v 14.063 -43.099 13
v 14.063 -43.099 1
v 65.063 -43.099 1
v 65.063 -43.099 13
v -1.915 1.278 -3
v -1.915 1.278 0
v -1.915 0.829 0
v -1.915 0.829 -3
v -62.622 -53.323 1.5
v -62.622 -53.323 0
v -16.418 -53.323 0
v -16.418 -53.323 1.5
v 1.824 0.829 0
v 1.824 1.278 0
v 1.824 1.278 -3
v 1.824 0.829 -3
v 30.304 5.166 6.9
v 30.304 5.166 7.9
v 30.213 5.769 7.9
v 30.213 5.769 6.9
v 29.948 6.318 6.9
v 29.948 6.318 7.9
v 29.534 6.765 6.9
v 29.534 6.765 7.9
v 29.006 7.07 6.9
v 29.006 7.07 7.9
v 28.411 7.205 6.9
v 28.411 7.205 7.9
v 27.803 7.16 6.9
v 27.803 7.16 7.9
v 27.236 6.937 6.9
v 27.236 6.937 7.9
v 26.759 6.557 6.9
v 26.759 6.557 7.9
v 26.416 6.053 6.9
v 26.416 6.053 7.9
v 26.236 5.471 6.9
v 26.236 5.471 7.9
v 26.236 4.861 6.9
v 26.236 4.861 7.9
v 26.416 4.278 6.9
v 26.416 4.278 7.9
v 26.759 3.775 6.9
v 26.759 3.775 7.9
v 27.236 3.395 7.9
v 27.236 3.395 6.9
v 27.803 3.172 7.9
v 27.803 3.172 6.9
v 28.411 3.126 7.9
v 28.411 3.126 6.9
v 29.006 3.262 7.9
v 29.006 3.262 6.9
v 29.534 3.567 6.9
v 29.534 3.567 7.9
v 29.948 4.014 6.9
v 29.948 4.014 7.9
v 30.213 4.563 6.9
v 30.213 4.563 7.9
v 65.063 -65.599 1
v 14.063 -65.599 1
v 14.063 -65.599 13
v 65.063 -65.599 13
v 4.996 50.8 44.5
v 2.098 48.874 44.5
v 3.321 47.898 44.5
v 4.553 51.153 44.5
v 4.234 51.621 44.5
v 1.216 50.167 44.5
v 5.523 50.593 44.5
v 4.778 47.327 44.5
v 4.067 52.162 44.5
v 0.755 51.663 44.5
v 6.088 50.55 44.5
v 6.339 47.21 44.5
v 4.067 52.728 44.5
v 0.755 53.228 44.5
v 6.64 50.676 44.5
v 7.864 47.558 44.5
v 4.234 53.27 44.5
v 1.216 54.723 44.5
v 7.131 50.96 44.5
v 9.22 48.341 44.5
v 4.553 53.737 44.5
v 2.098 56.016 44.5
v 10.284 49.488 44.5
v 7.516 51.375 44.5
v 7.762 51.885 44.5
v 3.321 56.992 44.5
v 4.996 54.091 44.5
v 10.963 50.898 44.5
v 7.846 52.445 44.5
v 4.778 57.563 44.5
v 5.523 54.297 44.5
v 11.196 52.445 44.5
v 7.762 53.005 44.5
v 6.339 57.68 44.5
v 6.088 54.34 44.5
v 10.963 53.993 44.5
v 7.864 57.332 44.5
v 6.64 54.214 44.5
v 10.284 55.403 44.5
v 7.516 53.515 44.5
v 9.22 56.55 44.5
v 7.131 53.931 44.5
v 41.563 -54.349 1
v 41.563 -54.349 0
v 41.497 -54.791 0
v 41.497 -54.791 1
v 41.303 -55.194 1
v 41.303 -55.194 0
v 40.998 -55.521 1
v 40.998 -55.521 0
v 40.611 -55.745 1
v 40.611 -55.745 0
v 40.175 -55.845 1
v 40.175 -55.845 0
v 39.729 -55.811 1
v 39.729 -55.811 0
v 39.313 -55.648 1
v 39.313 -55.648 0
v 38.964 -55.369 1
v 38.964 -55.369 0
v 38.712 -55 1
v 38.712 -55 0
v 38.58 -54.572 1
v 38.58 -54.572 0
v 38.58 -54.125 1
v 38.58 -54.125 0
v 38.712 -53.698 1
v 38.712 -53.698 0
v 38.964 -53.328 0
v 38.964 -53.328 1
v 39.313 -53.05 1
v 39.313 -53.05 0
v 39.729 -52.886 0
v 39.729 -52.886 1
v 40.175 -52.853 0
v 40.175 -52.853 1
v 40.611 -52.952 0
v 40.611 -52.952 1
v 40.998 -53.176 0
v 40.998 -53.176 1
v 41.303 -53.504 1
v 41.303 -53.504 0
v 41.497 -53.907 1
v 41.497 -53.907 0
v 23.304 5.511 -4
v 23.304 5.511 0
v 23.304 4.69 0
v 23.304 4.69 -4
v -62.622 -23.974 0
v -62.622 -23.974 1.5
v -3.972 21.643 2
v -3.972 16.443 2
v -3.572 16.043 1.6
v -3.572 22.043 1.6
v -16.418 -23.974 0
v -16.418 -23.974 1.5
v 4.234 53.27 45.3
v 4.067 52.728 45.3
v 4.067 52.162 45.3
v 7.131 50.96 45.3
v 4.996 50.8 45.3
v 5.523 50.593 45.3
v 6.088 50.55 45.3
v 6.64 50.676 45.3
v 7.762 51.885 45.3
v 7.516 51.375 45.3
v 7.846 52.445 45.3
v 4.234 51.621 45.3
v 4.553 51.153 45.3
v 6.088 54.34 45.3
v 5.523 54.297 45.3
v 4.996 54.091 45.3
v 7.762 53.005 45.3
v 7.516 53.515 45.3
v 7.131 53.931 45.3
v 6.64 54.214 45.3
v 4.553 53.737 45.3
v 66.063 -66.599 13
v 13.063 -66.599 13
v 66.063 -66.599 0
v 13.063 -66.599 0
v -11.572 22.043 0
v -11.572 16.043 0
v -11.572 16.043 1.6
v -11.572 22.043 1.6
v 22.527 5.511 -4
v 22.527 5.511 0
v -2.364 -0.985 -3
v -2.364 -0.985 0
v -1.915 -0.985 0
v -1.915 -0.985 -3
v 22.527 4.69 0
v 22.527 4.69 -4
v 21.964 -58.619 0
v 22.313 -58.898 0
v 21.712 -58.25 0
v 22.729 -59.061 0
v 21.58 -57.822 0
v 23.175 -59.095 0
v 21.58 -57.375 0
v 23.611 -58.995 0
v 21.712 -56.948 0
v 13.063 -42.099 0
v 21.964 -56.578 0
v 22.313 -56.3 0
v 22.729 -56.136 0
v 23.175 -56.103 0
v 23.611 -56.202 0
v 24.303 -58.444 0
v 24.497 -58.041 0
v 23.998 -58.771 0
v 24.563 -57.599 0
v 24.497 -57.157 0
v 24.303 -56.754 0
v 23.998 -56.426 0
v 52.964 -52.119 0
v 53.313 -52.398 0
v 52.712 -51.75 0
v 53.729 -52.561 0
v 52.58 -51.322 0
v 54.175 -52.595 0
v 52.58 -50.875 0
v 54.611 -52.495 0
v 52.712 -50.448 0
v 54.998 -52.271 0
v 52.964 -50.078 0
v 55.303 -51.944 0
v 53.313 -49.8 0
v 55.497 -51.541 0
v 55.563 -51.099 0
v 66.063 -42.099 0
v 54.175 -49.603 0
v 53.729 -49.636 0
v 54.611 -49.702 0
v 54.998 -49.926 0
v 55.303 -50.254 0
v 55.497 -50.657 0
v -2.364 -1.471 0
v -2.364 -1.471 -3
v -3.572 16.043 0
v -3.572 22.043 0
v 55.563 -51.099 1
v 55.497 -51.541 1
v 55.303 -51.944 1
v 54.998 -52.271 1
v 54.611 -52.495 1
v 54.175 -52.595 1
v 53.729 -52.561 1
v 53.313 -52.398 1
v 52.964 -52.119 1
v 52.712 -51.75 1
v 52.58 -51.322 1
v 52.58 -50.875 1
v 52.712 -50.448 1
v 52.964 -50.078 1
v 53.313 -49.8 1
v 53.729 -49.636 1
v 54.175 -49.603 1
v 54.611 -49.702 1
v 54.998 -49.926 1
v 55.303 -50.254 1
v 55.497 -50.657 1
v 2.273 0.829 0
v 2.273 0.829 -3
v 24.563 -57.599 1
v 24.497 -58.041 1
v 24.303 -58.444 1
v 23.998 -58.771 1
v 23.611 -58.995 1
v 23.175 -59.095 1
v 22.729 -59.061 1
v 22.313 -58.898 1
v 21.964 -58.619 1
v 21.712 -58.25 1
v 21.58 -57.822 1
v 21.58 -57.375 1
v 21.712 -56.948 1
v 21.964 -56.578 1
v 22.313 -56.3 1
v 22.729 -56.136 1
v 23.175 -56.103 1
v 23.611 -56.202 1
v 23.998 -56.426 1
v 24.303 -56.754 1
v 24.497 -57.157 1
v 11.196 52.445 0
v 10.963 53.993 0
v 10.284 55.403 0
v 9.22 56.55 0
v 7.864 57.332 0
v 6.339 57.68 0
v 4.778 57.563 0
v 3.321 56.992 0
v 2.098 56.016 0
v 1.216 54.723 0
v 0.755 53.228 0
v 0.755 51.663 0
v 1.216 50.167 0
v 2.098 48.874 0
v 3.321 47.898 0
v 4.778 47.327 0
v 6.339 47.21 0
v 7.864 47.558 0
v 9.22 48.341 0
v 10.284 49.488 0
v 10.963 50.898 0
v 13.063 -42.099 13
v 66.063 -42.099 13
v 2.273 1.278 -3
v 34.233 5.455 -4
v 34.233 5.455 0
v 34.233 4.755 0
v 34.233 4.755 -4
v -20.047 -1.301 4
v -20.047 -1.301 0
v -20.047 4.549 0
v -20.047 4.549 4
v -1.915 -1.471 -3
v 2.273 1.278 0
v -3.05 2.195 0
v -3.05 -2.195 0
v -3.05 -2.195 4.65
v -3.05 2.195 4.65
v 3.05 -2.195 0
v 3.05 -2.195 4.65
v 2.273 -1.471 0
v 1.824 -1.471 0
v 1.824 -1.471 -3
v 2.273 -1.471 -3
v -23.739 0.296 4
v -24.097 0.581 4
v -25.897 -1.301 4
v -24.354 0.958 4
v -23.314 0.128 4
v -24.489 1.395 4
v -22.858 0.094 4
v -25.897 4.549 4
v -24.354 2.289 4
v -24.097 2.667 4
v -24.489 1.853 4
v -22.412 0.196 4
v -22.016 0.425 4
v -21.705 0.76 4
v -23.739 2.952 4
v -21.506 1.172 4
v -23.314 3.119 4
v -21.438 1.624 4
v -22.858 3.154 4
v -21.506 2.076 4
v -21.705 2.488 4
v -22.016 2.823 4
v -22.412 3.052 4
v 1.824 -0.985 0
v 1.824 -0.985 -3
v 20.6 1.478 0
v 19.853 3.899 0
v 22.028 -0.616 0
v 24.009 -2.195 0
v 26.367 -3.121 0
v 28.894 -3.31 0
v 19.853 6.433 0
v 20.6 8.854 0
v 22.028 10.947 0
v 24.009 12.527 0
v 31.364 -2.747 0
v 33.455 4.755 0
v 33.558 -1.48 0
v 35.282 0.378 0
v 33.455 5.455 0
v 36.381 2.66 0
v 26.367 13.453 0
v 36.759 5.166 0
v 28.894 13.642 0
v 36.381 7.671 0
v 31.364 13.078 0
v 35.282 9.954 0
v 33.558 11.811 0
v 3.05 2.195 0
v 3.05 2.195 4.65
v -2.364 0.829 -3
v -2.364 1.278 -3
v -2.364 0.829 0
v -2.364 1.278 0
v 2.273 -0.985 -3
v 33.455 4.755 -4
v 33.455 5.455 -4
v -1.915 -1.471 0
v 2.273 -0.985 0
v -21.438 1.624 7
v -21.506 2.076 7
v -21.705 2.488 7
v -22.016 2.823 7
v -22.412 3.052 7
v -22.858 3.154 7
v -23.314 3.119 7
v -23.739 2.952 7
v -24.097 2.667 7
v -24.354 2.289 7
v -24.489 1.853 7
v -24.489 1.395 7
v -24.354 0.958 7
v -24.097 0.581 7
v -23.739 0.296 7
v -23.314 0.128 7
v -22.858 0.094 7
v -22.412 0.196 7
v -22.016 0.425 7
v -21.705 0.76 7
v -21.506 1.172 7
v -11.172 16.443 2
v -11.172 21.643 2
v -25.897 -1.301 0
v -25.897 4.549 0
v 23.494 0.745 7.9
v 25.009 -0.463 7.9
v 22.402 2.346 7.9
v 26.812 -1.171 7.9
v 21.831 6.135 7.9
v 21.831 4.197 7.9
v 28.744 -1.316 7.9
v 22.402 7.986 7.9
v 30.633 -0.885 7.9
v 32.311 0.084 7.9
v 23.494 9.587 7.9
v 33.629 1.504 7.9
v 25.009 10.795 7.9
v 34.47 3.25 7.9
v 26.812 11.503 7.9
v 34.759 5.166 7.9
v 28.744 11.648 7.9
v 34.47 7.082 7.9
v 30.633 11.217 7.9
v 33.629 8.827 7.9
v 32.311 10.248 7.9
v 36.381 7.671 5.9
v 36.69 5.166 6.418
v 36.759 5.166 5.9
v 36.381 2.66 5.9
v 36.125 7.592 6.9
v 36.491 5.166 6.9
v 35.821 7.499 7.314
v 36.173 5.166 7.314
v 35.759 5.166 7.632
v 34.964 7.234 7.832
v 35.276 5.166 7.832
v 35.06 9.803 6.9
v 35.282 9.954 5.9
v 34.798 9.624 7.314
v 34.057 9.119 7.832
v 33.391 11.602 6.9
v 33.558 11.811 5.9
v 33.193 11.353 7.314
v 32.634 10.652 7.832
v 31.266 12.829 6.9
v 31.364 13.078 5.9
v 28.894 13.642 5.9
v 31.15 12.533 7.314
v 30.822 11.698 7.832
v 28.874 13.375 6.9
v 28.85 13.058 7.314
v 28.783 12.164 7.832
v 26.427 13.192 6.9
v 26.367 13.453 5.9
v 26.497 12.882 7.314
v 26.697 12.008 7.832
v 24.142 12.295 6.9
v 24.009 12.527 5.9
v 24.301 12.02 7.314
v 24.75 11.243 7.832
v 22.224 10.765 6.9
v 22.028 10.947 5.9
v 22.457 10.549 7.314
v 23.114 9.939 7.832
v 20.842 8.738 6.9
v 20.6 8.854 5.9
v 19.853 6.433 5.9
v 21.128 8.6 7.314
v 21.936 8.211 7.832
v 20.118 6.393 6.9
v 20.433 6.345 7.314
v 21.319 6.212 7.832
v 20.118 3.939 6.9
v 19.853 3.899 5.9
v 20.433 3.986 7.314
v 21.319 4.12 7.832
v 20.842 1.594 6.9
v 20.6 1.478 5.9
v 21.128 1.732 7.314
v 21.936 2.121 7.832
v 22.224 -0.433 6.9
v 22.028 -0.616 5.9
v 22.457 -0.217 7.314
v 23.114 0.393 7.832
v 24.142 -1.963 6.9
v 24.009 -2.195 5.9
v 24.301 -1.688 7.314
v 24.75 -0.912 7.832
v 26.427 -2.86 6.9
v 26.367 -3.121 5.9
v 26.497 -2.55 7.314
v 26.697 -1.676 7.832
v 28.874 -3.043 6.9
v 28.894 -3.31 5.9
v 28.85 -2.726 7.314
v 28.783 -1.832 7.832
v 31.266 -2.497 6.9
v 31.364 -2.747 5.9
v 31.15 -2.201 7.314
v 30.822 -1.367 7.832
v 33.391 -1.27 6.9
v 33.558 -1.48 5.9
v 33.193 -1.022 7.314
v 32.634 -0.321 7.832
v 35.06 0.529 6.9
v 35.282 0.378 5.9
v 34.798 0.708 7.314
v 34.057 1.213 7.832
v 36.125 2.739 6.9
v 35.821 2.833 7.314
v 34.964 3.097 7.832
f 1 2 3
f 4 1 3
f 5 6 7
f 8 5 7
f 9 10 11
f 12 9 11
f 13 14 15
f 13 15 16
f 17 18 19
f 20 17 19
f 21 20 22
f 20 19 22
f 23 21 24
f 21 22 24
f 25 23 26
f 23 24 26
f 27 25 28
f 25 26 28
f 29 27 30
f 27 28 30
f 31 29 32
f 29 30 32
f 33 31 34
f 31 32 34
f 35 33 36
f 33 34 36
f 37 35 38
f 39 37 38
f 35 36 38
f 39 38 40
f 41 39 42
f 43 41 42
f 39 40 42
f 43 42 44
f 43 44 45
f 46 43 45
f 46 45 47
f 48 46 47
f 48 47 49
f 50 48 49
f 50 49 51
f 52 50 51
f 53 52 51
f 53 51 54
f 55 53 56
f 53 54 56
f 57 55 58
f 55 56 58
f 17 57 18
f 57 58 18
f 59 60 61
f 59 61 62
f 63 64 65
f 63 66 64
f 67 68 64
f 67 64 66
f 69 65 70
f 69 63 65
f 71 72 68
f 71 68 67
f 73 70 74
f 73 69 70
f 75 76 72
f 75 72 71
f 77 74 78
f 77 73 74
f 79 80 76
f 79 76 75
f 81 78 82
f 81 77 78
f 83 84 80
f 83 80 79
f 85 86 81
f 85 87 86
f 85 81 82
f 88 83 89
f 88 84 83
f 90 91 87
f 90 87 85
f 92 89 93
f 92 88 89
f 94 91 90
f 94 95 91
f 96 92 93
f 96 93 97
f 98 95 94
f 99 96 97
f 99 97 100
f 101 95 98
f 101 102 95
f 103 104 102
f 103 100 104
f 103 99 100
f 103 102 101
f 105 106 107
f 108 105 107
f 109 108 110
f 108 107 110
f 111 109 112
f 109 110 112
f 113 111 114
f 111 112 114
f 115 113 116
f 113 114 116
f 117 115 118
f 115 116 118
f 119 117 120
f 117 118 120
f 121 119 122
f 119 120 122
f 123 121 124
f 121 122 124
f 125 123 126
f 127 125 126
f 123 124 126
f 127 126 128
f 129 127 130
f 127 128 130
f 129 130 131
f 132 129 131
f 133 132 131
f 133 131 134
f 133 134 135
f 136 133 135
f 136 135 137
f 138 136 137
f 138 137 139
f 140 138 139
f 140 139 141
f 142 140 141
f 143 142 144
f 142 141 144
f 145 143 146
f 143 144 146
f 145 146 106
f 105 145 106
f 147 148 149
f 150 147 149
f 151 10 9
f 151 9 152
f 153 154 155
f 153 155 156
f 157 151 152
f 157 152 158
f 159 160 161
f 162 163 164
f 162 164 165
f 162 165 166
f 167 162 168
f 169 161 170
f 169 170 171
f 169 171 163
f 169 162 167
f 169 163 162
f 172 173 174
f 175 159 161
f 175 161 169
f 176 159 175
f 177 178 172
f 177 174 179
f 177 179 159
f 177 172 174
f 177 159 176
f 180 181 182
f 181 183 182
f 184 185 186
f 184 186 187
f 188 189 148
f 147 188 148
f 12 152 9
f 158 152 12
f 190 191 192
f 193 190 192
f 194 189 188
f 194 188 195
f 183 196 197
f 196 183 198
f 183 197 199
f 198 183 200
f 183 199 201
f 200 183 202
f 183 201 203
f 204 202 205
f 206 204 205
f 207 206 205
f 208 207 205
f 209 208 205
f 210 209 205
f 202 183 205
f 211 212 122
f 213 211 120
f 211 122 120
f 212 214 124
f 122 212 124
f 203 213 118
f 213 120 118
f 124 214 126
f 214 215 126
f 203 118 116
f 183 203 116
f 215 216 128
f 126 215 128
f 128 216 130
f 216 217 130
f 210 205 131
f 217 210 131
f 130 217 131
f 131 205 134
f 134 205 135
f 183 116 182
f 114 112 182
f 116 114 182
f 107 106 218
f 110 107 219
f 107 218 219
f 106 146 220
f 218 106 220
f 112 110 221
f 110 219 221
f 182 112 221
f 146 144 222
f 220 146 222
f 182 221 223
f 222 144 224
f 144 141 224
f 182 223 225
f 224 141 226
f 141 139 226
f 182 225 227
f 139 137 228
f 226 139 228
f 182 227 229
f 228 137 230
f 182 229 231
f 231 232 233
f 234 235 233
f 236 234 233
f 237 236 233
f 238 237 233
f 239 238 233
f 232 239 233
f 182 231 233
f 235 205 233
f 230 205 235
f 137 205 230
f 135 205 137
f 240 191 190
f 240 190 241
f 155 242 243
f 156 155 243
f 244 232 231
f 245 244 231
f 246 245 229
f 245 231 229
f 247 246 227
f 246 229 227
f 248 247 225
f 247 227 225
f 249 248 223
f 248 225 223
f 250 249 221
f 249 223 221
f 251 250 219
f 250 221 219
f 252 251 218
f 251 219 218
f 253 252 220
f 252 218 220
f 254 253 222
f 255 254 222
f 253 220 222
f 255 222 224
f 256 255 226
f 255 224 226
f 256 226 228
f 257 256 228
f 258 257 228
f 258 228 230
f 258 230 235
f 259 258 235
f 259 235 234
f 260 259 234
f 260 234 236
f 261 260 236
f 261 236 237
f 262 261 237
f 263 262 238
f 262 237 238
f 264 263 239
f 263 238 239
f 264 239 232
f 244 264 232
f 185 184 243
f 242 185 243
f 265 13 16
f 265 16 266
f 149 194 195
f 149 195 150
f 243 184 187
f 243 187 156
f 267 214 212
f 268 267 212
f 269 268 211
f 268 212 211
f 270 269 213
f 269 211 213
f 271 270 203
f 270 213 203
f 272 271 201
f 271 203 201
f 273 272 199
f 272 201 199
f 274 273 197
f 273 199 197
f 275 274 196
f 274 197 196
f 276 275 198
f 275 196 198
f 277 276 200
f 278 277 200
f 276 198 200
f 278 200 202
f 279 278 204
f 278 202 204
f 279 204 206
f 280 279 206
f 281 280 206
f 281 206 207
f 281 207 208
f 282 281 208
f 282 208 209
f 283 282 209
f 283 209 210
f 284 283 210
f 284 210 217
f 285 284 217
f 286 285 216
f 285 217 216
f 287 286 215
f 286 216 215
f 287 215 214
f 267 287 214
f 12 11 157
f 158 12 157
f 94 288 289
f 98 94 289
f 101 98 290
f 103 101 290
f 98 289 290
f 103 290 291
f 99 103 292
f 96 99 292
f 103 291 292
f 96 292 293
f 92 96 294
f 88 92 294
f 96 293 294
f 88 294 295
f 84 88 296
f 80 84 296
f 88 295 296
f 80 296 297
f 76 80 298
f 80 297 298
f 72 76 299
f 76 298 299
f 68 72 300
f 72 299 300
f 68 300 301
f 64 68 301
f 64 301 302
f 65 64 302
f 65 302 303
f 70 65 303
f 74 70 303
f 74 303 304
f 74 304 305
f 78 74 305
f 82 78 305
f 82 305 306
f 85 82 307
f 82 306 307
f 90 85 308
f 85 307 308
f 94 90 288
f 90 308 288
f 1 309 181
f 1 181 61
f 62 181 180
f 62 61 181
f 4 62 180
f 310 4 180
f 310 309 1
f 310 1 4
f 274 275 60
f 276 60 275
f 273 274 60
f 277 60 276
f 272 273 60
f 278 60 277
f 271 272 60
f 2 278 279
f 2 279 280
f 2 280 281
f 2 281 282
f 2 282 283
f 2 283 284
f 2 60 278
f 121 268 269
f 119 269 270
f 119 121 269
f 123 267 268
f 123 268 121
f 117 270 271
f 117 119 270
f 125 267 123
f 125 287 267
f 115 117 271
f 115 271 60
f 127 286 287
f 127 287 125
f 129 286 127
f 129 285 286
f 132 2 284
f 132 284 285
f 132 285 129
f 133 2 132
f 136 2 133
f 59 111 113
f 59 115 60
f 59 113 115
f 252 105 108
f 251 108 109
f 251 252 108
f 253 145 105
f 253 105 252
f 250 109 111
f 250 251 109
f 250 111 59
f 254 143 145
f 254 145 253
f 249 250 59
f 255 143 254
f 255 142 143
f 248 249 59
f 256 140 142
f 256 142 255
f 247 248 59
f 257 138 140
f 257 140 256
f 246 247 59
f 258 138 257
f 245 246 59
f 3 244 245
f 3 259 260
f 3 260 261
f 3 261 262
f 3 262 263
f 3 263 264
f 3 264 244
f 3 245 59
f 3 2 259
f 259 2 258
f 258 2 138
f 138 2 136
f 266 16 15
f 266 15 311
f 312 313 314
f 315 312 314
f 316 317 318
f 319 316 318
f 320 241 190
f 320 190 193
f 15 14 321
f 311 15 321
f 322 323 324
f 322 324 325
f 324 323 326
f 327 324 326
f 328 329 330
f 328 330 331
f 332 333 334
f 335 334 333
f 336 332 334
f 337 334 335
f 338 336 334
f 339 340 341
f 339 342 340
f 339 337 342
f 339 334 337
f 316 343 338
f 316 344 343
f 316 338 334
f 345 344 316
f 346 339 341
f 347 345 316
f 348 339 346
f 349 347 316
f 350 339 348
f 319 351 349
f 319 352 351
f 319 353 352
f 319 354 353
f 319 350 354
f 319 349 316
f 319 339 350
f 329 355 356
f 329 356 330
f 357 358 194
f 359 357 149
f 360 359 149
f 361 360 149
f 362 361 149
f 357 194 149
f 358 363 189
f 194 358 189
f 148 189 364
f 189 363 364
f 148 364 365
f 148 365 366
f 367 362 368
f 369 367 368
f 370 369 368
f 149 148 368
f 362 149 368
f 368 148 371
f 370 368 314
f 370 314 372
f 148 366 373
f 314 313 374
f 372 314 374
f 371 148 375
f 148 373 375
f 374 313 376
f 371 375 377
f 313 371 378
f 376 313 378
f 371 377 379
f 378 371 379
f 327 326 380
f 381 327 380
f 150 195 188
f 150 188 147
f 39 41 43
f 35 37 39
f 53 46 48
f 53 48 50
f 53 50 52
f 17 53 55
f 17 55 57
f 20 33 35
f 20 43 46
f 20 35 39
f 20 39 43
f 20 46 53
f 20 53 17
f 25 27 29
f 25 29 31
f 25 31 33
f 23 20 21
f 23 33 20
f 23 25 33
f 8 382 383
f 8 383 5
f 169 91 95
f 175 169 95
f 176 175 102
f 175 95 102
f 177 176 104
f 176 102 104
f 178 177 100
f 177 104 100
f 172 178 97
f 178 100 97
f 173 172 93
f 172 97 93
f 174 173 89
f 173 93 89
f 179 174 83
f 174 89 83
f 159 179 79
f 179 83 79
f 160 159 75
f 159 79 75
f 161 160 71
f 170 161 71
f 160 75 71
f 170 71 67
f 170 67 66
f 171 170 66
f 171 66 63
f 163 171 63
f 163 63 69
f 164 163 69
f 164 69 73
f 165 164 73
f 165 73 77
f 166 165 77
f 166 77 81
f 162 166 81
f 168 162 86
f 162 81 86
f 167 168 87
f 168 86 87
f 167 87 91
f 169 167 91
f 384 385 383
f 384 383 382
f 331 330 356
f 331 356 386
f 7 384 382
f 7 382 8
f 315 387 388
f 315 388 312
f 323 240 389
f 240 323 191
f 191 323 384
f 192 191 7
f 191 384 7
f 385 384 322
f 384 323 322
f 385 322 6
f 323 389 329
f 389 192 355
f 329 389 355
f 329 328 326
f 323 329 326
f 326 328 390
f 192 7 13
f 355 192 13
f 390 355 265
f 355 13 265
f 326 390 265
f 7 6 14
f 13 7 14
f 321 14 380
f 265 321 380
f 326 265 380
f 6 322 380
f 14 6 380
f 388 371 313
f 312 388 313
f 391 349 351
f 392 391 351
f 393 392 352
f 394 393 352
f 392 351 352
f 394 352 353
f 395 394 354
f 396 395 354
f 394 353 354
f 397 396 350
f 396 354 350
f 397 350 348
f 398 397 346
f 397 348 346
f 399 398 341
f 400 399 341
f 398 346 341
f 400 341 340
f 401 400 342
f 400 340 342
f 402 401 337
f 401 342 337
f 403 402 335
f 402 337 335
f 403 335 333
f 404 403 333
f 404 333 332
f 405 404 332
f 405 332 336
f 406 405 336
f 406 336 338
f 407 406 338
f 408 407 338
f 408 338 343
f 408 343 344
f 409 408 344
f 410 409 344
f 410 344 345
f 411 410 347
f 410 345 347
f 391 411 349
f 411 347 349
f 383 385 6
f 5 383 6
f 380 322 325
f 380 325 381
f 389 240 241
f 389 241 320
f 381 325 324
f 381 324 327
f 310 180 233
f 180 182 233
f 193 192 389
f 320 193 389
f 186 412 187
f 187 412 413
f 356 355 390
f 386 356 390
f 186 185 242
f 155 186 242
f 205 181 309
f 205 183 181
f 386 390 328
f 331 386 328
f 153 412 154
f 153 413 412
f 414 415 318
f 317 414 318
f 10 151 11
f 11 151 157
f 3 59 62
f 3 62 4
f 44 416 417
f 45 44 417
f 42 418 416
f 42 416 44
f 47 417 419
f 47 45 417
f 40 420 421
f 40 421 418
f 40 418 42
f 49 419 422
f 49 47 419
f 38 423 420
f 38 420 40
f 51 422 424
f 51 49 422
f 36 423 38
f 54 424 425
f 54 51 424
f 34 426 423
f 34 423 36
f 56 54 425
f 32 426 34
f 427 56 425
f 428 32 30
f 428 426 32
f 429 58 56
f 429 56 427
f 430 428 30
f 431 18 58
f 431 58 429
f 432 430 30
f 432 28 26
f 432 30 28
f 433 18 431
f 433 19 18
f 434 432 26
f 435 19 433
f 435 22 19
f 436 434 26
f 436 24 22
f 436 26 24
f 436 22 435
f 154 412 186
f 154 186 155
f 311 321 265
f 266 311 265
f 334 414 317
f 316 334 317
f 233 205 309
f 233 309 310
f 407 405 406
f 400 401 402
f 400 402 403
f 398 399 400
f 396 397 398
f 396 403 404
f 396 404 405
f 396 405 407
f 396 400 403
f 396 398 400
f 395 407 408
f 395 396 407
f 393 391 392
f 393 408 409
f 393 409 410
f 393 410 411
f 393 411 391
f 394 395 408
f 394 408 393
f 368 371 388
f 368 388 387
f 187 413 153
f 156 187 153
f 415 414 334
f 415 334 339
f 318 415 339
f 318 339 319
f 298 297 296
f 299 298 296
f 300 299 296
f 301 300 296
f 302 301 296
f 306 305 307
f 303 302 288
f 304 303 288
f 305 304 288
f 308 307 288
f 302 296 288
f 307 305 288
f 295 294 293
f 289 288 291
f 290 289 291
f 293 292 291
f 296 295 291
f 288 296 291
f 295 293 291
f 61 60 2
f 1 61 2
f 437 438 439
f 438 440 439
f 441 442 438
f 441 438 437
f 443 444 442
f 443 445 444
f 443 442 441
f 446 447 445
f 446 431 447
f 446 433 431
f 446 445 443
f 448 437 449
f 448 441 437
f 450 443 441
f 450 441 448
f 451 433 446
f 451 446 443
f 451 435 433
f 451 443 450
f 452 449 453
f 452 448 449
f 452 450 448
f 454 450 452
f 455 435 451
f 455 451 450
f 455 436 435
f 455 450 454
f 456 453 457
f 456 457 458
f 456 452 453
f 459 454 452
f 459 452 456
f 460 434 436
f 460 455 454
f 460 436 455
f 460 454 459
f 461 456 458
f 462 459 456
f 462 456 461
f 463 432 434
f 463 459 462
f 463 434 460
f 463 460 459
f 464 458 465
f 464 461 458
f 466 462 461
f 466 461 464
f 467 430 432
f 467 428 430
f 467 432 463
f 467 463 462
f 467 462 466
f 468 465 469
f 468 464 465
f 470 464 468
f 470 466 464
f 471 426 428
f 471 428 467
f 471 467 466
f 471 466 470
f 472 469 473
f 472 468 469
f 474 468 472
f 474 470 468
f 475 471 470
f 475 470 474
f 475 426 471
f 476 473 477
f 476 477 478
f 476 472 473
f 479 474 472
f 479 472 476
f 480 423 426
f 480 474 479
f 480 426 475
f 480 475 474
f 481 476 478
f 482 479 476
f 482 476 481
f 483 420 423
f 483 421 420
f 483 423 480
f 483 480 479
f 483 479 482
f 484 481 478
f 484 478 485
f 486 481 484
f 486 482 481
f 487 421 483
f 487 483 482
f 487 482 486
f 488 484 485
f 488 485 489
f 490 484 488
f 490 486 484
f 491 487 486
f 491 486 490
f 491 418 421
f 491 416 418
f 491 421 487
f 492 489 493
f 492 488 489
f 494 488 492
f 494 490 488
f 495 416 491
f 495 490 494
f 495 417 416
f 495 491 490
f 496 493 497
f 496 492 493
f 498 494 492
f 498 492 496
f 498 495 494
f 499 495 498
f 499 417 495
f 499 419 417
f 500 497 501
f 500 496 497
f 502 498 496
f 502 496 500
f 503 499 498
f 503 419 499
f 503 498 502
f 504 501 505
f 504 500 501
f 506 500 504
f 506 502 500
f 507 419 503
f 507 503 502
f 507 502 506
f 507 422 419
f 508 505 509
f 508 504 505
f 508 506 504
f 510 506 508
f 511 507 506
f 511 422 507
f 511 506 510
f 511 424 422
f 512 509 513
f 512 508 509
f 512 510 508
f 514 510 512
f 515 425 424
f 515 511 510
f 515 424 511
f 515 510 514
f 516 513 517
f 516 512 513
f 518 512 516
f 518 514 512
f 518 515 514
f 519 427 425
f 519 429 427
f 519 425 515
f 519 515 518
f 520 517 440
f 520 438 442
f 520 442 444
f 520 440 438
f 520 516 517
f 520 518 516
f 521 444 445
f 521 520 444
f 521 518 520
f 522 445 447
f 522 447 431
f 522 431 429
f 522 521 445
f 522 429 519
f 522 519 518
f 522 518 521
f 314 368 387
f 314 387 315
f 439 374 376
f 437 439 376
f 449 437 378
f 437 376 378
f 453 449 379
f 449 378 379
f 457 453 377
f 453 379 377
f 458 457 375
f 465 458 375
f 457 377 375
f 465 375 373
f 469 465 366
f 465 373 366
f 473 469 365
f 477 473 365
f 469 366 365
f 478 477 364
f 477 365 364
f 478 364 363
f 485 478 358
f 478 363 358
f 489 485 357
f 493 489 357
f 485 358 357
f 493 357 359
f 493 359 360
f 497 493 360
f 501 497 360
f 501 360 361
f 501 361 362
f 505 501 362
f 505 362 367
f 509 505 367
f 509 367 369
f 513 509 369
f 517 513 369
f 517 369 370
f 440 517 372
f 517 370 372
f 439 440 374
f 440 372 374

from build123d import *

# Parameters (mm, degrees)
F0_W      = 6.1
F0_H      = 4.39
F1_DEPTH  = 4.65
F2_W      = 0.448795
F2_H      = 0.48622
F2_H_2    = 0.448818
F3_DEPTH  = 3
F4_W      = 5.85
F4_H      = 5.85
F5_DEPTH  = 4
F6_R      = 1.5339
F7_DEPTH  = 3
F8_R      = 8.5
F9_DEPTH  = 7.9
F10_R     = 2
F11_R     = 2.045194
F12_DEPTH = 1
F13_W     = 0.777537
F13_H     = 0.820734
F13_W_2   = 0.777539
F13_H_2   = 0.699977
F14_DEPTH = 4
F15_W     = 8
F15_H     = 6
F16_DEPTH = 2
F17_SIZE  = 0.4
F18_R     = 5.25
F19_DEPTH = 44.5
F20_R     = 1.9
F21_DEPTH = 0.8
F22_W     = 46.203874
F22_H     = 29.349632
F23_DEPTH = 1.5
F24_W     = 53
F24_H     = 24.5
F25_DEPTH = 1
F26_W     = 53
F26_H     = 24.5
F26_W_2   = 51
F26_H_2   = 22.5
F27_DEPTH = 12
F28_R     = 1.5
F29_DEPTH = 1


with BuildPart() as f1:
    # F0 (on Top) → F1 (new body)
    with BuildSketch(Plane.XY):
        Rectangle(F0_W, F0_H)
    extrude(amount=F1_DEPTH)

    # F2 (on face) → F3 (join)
    with BuildSketch(Plane(origin=(0, 0, 0), x_dir=(1, 0, 0), z_dir=(0, 0, -1))):
        with Locations((-2.139867, 1.227854)):
            Rectangle(F2_W, F2_H)
        with Locations((-2.139867, -1.053639)):
            Rectangle(F2_W, F2_H_2)
        with Locations((2.048888, 1.227854)):
            Rectangle(F2_W, F2_H)
        with Locations((2.048888, -1.053639)):
            Rectangle(F2_W, F2_H_2)
    extrude(amount=F3_DEPTH)


with BuildPart() as f5:
    # F4 (on Top) → F5 (new body)
    with BuildSketch(Plane.XY):
        with Locations((-22.972229, 1.6239)):
            Rectangle(F4_W, F4_H)
    extrude(amount=F5_DEPTH)

    # F6 (on face) → F7 (join)
    with BuildSketch(Plane.XY.offset(4)):
        with Locations((-22.972229, 1.6239)):
            Circle(F6_R)
    extrude(amount=F7_DEPTH)


with BuildPart() as f9:
    # F8 (on Top) → F9 (new body)
    with BuildSketch(Plane.XY):
        with Locations((28.258514, 5.165863)):
            Circle(F8_R)
    extrude(amount=F9_DEPTH)

    # F10
    f10_edges = [f9.edges().sort_by_distance(p)[0] for p in [
        (19.758514, 5.165863, 7.9),
    ]]
    fillet(f10_edges, radius=F10_R)

    # F11 (on face) → F12 (cut)
    with BuildSketch(Plane.XY.offset(7.9)):
        with Locations((28.258514, 5.165863)):
            Circle(F11_R)
    extrude(amount=-F12_DEPTH, mode=Mode.SUBTRACT)

    # F13 (on face) → F14 (join)
    with BuildSketch(Plane(origin=(0, 0, 0), x_dir=(1, 0, 0), z_dir=(0, 0, -1))):
        with Locations((22.915408, -5.100402)):
            Rectangle(F13_W, F13_H)
        with Locations((33.844127, -5.104819)):
            Rectangle(F13_W_2, F13_H_2)
    extrude(amount=F14_DEPTH)


with BuildPart() as f16:
    # F15 (on Top) → F16 (new body)
    with BuildSketch(Plane.XY):
        with Locations((-7.572418, 19.042922)):
            Rectangle(F15_W, F15_H)
    extrude(amount=F16_DEPTH)

    # F17
    f17_edges = [f16.edges().sort_by_distance(p)[0] for p in [
        (-7.572418, 16.042922, 2),
        (-7.572418, 22.042922, 2),
        (-3.572418, 19.042922, 2),
        (-11.572418, 19.042922, 2),
    ]]
    chamfer(f17_edges, length=F17_SIZE)


with BuildPart() as f19:
    # F18 (on Top) → F19 (new body)
    with BuildSketch(Plane.XY):
        with Locations((5.946203, 52.445121)):
            Circle(F18_R)
    extrude(amount=F19_DEPTH)

    # F20 (on face) → F21 (join)
    with BuildSketch(Plane.XY.offset(44.5)):
        with Locations((5.946203, 52.445121)):
            Circle(F20_R)
    extrude(amount=F21_DEPTH)


with BuildPart() as f23:
    # F22 (on Top) → F23 (new body)
    with BuildSketch(Plane.XY):
        with Locations((-39.520297, -38.648531)):
            Rectangle(F22_W, F22_H)
    extrude(amount=F23_DEPTH)


with BuildPart() as f25:
    # F24 (on Top) → F25 (new body)
    with BuildSketch(Plane.XY):
        with Locations((39.563232, -54.34875)):
            Rectangle(F24_W, F24_H)
    extrude(amount=F25_DEPTH)

    # F26 (on face) → F27 (join)
    with BuildSketch(Plane.XY.offset(1)):
        with Locations((39.563232, -54.34875)):
            Rectangle(F26_W, F26_H)
        with Locations((39.563232, -54.34875)):
            Rectangle(F26_W_2, F26_H_2, mode=Mode.SUBTRACT)
    extrude(amount=F27_DEPTH)

    # F28 (on face) → F29 (cut, through all)
    with BuildSketch(Plane(origin=(0, 0, 0), x_dir=(1, 0, 0), z_dir=(0, 0, -1))):
        with Locations((23.063232, 57.59875)):
            Circle(F28_R)
        with Locations((40.063232, 54.34875)):
            Circle(F28_R)
        with Locations((54.063232, 51.09875)):
            Circle(F28_R)
    extrude(amount=-F29_DEPTH, mode=Mode.SUBTRACT)


solid = Compound([f1.part, f5.part, f9.part, f16.part, f19.part, f23.part, f25.part])
